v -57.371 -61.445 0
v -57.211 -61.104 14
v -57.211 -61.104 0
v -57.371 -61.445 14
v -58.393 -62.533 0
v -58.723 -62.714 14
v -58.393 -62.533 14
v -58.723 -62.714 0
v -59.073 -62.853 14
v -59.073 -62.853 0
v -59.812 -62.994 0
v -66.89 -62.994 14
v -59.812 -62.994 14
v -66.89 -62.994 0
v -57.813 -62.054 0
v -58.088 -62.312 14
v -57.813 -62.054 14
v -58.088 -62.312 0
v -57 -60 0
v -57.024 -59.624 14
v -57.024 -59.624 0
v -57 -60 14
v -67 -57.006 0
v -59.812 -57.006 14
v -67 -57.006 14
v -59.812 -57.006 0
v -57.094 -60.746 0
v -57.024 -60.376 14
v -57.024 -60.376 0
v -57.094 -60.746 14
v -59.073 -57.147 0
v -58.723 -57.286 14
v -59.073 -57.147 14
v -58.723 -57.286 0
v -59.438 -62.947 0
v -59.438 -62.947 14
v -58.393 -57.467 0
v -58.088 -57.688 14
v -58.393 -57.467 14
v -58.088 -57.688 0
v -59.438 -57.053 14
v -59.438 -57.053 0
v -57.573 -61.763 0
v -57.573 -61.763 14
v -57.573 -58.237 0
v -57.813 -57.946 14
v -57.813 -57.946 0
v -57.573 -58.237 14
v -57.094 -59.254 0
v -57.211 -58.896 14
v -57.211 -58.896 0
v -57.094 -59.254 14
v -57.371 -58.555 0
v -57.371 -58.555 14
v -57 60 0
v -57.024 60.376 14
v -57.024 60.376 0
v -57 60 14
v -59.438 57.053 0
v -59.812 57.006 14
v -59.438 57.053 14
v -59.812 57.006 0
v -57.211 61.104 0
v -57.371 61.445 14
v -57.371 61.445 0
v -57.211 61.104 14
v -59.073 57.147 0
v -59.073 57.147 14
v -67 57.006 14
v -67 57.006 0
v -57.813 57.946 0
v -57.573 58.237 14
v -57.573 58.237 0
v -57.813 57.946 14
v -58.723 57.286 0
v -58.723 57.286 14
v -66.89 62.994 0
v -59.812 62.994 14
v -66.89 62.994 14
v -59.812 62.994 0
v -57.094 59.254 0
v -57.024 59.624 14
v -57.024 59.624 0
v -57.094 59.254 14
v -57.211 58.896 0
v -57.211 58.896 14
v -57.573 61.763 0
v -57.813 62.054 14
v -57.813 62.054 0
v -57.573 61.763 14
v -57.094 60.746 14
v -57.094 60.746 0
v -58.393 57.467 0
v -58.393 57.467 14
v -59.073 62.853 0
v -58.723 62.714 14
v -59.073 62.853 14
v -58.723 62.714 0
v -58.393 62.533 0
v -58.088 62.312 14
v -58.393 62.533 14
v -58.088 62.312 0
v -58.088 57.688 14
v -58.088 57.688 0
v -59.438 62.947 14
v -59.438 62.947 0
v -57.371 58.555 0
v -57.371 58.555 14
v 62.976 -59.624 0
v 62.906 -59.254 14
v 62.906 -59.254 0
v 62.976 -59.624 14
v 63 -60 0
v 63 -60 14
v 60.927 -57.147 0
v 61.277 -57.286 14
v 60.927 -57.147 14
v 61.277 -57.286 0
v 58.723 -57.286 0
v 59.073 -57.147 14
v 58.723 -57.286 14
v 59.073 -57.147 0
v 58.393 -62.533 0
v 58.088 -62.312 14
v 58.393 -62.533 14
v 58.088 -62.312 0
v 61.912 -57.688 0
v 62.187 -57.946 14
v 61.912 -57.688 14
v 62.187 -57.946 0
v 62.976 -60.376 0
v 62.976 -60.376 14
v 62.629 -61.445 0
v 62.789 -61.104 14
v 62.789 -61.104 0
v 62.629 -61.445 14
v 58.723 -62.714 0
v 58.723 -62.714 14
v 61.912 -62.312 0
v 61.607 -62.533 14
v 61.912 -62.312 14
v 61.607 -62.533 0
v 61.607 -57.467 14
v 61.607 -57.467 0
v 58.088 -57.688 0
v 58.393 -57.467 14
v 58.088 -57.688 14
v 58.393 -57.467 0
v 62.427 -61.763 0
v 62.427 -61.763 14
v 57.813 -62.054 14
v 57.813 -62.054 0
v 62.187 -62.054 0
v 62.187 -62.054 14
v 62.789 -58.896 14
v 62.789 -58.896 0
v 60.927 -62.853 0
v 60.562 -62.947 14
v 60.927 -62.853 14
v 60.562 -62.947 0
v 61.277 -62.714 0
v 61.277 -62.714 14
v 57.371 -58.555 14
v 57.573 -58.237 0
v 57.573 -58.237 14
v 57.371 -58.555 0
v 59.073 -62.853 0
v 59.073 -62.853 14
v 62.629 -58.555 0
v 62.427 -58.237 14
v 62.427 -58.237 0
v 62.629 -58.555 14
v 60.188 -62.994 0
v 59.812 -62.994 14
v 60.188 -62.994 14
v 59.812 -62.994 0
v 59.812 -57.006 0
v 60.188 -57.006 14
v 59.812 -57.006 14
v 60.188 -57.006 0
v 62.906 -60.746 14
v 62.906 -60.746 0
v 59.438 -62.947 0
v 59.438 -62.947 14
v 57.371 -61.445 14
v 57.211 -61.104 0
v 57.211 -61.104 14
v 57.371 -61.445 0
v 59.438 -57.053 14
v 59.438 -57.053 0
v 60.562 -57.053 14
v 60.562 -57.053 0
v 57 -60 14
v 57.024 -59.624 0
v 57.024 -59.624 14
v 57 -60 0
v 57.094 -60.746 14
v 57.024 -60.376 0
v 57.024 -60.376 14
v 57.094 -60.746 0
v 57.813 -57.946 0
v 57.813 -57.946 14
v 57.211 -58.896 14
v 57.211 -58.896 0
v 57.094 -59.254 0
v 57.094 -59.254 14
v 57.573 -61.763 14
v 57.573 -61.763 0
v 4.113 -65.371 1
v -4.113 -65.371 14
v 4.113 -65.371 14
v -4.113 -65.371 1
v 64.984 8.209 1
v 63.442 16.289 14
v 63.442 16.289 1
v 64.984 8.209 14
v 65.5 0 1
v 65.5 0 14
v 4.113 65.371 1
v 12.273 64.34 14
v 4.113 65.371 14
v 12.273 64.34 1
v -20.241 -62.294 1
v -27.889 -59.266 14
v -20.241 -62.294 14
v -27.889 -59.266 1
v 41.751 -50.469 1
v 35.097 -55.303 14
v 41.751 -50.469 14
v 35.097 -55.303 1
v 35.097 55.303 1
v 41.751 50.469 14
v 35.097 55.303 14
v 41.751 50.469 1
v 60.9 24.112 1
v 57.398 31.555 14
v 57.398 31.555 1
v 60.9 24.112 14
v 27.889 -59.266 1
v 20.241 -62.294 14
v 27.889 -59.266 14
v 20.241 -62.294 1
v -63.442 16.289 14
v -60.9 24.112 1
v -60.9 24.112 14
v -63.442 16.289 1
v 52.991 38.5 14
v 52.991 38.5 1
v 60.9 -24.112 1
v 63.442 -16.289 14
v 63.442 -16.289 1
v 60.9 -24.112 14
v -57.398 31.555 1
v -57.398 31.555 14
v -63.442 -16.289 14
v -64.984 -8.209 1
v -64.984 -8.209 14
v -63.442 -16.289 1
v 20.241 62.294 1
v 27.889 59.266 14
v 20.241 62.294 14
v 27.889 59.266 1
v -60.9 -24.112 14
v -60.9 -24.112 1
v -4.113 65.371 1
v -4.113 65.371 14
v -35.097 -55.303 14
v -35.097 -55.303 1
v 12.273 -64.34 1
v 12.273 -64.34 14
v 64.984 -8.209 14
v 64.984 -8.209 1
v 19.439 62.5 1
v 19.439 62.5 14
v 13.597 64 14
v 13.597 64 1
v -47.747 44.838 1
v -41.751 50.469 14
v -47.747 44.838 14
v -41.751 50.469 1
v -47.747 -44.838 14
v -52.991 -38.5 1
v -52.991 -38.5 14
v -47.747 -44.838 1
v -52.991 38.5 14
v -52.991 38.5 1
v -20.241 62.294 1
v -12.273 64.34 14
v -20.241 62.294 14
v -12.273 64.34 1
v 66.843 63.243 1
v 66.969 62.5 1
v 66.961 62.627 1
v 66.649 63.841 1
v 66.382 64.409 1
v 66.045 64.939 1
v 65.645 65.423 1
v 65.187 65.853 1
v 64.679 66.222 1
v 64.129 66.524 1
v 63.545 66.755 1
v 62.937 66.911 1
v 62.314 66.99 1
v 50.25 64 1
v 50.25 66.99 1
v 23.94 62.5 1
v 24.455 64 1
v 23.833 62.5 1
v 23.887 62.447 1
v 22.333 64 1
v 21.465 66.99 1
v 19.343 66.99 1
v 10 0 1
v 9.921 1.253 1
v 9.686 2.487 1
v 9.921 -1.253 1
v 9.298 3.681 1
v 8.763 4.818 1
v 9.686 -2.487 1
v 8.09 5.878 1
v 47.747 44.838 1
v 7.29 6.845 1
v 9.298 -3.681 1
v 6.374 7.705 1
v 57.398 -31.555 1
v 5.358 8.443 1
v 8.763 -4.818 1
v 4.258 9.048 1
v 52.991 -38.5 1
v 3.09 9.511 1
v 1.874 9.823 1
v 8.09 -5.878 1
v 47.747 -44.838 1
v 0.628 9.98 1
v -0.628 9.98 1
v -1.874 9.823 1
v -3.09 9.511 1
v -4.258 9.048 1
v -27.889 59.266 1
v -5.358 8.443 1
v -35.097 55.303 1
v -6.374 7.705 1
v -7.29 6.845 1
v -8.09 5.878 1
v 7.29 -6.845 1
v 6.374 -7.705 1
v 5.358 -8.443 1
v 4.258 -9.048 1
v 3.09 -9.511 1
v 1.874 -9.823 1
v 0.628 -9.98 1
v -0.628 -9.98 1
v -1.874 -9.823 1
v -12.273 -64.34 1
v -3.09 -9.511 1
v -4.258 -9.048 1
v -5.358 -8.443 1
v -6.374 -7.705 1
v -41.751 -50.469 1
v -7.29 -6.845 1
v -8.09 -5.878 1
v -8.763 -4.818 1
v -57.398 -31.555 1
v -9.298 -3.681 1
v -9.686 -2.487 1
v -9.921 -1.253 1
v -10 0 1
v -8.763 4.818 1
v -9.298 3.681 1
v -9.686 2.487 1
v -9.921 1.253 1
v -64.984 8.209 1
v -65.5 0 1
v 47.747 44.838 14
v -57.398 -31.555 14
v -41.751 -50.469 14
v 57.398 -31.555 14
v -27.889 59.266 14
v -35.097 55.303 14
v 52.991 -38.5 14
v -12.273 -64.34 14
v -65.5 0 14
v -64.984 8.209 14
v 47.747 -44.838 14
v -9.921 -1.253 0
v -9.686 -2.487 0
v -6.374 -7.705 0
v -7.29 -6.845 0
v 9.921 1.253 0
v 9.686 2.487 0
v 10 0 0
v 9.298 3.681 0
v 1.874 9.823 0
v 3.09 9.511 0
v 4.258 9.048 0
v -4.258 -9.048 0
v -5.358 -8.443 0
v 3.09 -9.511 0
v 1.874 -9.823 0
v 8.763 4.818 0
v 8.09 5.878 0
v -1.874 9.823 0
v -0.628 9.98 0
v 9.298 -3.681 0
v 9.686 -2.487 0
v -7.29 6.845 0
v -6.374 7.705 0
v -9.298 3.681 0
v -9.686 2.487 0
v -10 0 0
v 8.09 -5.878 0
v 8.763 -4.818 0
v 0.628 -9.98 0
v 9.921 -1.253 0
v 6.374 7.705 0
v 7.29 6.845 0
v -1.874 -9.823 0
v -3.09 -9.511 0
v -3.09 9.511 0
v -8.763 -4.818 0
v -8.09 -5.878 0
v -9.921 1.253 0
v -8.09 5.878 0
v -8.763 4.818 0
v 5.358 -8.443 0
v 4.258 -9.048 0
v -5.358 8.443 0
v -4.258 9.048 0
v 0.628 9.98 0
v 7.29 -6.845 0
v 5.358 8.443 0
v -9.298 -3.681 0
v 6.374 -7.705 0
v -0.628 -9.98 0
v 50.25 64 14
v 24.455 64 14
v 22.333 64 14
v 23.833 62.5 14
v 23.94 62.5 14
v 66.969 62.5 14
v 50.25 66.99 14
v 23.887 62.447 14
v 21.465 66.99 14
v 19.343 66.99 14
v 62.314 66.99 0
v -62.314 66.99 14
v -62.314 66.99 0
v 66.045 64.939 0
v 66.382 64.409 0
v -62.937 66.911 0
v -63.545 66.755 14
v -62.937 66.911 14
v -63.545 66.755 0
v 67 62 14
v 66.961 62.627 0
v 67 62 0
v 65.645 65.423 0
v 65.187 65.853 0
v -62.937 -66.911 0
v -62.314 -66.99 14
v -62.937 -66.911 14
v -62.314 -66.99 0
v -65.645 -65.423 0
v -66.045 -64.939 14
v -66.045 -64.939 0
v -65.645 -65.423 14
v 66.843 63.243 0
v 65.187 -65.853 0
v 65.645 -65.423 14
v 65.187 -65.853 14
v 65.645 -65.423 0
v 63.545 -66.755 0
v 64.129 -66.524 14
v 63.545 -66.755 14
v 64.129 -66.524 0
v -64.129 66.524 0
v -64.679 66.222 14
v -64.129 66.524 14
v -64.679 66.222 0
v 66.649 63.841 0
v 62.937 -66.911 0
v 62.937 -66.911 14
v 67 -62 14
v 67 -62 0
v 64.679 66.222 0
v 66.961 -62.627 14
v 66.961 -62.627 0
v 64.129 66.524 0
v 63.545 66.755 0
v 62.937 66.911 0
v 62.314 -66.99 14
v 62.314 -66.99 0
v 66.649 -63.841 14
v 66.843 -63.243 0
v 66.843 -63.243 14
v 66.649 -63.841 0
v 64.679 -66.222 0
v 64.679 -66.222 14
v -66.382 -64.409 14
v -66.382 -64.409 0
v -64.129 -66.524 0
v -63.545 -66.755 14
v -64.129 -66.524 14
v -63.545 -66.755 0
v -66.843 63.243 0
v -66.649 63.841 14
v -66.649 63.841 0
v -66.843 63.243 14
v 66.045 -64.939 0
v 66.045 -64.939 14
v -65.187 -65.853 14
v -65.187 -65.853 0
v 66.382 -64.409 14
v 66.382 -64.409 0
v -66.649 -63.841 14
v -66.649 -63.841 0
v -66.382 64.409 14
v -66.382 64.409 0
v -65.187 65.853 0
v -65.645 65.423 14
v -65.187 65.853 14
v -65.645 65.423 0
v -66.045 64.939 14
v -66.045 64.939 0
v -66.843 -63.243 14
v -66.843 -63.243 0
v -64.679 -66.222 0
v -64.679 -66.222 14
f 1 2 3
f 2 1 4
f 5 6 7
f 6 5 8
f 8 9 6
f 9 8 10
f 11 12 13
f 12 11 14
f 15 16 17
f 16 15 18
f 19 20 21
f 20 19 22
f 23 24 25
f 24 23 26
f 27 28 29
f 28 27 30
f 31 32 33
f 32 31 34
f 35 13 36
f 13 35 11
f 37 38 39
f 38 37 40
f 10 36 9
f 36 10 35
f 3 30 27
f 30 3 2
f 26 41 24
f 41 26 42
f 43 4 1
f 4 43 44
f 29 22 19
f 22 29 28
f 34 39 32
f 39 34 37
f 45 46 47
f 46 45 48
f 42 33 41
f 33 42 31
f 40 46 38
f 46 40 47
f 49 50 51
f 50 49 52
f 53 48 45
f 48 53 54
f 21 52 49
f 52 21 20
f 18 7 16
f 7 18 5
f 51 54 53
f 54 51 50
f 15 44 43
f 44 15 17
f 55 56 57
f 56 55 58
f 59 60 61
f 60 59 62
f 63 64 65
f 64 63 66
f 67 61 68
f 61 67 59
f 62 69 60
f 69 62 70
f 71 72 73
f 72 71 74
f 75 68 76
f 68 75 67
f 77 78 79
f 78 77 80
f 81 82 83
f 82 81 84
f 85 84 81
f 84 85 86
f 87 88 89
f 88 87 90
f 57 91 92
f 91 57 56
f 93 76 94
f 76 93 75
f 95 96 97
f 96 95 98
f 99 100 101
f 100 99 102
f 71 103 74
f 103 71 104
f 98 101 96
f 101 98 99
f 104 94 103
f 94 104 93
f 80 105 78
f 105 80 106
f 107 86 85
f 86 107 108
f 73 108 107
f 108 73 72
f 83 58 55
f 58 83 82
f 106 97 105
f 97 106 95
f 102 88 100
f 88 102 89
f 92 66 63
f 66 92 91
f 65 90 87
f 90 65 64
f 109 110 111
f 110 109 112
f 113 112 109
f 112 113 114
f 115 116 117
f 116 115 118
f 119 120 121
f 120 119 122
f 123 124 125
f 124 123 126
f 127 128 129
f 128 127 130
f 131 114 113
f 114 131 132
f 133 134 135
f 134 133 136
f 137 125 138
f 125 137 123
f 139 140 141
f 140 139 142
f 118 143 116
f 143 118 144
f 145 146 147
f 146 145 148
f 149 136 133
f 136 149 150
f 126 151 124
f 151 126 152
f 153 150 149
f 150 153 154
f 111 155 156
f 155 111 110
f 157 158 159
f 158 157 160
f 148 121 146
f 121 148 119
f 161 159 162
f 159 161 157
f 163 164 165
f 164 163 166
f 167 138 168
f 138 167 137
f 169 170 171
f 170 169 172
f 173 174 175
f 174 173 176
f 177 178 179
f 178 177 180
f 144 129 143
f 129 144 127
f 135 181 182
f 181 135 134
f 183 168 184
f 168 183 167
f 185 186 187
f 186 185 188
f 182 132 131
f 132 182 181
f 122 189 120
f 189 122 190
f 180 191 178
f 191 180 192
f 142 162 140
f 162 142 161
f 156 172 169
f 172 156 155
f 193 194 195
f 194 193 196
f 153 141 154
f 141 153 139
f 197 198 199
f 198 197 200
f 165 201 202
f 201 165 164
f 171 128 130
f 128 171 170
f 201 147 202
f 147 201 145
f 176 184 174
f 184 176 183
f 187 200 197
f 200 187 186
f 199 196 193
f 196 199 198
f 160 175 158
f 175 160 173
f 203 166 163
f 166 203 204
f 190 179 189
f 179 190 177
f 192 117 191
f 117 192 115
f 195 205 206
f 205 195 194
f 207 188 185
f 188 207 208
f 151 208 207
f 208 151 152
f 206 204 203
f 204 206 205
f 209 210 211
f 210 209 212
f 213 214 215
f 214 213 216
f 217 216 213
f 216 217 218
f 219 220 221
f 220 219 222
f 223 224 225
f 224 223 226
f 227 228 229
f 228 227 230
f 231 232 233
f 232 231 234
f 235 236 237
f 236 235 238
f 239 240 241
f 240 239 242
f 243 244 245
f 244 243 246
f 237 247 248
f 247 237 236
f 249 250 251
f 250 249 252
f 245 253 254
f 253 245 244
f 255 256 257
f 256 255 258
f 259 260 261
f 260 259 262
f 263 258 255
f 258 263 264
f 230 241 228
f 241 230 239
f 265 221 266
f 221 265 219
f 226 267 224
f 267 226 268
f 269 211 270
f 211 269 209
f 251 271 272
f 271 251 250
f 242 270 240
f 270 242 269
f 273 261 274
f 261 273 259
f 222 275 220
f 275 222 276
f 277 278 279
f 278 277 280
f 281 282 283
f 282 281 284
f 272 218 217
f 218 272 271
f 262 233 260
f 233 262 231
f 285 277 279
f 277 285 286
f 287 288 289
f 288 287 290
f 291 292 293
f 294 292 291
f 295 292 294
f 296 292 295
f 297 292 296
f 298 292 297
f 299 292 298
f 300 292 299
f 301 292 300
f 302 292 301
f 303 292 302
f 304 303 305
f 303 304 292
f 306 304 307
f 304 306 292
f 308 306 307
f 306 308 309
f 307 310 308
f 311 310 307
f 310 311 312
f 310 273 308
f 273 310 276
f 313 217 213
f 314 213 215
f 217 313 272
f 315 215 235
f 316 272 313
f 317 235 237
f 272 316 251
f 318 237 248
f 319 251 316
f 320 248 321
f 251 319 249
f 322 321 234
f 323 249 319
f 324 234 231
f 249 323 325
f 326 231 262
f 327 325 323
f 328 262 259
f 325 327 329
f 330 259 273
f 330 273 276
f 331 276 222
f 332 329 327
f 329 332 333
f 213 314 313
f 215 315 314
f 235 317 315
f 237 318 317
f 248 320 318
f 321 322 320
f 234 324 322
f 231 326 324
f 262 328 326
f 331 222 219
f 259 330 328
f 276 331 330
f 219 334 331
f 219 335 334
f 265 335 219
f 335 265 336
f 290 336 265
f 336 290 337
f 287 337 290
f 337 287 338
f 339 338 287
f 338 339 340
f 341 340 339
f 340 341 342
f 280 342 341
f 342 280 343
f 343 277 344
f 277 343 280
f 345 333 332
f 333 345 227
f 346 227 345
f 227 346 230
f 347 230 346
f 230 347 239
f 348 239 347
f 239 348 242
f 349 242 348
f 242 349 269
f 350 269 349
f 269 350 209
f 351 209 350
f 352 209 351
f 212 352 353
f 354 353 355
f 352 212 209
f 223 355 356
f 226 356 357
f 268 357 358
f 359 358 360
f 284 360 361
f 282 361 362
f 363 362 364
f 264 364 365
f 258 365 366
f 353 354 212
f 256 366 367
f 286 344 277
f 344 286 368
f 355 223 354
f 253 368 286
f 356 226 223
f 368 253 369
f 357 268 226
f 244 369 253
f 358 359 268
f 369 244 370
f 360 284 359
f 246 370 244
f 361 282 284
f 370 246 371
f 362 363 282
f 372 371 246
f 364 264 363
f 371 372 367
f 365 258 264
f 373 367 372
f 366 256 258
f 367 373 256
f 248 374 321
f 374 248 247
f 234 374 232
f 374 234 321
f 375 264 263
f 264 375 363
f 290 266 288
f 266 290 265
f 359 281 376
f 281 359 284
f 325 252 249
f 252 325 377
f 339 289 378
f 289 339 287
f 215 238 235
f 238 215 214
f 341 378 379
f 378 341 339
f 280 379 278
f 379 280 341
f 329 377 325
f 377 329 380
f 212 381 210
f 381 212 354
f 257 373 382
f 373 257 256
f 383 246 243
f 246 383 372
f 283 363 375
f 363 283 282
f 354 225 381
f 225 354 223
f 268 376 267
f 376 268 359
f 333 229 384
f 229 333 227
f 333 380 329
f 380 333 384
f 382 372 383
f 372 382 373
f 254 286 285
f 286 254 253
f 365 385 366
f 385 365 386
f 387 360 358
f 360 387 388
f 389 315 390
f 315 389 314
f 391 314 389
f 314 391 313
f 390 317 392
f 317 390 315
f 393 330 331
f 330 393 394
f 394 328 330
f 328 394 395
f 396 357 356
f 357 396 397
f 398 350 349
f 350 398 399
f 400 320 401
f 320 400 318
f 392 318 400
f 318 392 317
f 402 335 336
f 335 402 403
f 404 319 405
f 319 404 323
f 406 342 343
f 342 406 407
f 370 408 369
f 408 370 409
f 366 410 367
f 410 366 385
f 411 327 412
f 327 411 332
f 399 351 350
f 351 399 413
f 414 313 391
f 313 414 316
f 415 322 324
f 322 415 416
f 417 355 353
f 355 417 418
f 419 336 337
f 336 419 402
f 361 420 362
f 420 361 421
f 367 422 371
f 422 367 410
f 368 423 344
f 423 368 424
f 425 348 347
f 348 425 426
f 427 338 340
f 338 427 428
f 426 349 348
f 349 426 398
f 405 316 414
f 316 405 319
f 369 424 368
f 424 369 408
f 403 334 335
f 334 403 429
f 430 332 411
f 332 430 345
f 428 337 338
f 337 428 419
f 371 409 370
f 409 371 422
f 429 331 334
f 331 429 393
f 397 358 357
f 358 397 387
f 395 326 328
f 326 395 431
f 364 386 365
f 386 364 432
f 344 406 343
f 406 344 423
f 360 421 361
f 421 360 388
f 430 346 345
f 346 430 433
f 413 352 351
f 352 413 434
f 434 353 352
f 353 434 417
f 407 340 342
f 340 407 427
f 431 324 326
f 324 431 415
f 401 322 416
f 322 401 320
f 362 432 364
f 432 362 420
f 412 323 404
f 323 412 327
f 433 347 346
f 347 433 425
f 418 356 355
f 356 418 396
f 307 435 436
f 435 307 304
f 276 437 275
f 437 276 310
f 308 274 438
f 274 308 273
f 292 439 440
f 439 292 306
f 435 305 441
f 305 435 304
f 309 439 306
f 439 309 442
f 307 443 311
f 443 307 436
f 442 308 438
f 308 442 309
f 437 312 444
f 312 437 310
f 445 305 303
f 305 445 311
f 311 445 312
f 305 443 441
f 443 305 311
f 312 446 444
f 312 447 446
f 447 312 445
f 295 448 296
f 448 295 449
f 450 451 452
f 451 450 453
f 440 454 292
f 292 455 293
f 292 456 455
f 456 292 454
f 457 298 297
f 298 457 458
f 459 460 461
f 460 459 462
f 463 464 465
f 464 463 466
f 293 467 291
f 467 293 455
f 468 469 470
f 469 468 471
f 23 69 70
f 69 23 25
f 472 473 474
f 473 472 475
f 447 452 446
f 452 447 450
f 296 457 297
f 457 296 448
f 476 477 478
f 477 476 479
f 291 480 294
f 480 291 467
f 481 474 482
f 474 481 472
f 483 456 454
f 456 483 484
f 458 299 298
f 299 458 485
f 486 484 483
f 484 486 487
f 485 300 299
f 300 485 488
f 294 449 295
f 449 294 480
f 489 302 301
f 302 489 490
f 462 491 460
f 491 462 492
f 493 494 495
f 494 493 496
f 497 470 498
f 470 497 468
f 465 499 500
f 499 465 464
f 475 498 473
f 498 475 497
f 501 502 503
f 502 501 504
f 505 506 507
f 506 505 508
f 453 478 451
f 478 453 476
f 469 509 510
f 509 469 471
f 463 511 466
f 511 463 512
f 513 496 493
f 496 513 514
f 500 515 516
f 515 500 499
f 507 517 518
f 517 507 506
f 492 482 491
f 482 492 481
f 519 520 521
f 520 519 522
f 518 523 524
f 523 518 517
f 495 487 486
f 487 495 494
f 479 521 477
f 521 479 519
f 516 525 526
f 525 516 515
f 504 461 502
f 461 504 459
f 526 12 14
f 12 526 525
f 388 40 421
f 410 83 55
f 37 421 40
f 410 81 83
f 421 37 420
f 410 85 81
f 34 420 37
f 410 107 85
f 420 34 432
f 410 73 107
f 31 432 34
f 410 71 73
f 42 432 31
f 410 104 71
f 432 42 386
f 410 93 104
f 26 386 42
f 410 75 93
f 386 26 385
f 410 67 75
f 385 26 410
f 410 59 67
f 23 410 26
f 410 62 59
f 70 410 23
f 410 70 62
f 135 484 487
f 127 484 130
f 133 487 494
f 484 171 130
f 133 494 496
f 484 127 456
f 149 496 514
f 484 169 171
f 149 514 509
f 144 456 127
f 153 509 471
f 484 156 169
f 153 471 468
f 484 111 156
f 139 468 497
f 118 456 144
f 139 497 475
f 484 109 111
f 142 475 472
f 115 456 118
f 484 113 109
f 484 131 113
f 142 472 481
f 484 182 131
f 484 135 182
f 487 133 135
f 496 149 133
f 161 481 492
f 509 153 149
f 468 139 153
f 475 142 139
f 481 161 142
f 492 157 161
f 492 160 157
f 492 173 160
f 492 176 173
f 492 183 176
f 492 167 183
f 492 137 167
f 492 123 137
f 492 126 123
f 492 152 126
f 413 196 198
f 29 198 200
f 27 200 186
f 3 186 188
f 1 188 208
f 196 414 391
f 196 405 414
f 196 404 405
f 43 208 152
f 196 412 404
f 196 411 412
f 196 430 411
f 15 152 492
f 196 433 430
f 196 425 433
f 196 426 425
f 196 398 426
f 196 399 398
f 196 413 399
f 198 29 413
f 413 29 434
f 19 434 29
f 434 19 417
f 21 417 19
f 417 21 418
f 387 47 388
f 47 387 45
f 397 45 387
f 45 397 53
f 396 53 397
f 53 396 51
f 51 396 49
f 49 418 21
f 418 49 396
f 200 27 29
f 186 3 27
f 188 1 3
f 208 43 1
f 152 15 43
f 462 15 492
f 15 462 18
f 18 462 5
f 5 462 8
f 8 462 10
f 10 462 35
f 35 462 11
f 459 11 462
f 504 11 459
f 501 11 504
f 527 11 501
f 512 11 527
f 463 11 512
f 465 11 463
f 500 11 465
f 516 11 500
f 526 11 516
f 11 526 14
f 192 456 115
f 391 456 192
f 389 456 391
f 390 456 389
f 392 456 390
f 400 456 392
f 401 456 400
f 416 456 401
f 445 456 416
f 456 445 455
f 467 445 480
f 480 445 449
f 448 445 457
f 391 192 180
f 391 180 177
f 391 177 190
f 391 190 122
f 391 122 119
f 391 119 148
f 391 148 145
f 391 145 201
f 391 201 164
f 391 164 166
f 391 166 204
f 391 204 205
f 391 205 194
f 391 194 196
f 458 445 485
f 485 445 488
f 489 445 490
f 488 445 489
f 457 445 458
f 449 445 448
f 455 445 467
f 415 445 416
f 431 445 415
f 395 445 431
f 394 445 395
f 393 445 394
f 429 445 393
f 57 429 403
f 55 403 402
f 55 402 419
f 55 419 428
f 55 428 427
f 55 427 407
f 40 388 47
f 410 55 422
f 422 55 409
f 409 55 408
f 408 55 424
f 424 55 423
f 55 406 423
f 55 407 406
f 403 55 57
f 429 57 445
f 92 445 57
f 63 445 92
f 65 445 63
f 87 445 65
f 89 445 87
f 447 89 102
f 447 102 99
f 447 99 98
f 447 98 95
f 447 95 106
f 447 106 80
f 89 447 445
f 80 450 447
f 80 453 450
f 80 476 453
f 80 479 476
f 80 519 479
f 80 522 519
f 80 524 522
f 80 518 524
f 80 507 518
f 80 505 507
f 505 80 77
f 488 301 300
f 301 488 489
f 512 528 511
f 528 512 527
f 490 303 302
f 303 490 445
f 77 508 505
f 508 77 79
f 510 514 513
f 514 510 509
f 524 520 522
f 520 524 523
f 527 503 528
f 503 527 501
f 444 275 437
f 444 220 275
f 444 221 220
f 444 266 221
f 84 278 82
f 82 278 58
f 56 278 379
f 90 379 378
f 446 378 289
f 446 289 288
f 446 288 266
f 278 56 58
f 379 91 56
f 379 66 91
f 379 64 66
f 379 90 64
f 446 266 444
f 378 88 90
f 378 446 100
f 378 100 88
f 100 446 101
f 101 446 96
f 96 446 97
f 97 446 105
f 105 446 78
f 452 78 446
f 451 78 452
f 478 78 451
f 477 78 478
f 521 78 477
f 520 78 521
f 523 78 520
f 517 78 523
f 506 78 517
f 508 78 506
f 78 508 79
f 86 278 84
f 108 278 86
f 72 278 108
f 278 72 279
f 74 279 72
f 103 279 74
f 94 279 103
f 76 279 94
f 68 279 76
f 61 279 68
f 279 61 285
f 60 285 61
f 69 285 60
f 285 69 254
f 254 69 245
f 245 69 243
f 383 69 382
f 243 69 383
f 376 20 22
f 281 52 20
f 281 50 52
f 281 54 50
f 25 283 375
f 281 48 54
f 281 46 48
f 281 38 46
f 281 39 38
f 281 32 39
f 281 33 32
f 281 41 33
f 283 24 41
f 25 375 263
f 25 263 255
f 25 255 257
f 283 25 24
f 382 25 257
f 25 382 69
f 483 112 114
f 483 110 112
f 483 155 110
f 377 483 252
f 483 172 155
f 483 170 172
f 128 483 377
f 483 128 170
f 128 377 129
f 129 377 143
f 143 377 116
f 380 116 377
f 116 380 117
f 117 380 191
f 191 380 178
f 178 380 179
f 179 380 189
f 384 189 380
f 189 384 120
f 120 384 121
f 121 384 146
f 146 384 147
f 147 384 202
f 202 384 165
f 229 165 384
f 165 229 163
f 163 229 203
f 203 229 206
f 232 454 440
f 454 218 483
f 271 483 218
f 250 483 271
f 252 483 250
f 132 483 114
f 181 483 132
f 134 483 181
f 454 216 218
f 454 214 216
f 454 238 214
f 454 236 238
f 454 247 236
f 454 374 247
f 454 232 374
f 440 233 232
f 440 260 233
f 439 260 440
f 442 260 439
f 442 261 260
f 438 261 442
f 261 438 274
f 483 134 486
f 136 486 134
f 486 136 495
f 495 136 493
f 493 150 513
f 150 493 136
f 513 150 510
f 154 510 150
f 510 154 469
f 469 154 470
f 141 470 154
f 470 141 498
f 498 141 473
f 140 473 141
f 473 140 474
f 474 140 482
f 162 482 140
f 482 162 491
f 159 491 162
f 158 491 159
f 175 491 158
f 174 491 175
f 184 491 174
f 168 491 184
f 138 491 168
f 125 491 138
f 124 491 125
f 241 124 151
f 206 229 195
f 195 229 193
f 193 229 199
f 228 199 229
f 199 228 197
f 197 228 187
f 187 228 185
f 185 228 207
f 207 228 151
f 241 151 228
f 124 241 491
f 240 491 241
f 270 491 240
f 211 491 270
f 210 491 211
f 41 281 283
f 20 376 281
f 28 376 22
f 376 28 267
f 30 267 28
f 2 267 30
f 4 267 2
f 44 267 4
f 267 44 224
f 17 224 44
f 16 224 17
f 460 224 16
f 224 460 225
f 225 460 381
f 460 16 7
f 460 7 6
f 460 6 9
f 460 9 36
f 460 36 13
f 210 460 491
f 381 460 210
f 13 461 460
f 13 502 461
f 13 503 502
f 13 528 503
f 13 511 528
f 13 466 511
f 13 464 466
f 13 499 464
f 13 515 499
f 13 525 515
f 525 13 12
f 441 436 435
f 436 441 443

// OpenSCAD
$fn = 50;


difference() {
	union() {
		translate(v = [0, 0, 0]) {
			rotate(a = [0, 0, 0]) {
				hull() {
					translate(v = [-62.0000000000, 62.0000000000, 0]) {
						rotate(a = [0, 0, 0]) {
							translate(v = [0, 0, 0]) {
								rotate(a = [0, 0, 0]) {
									cylinder(h = 14, r = 5);
								}
							}
						}
					}
					translate(v = [62.0000000000, 62.0000000000, 0]) {
						rotate(a = [0, 0, 0]) {
							translate(v = [0, 0, 0]) {
								rotate(a = [0, 0, 0]) {
									cylinder(h = 14, r = 5);
								}
							}
						}
					}
					translate(v = [-62.0000000000, -62.0000000000, 0]) {
						rotate(a = [0, 0, 0]) {
							translate(v = [0, 0, 0]) {
								rotate(a = [0, 0, 0]) {
									cylinder(h = 14, r = 5);
								}
							}
						}
					}
					translate(v = [62.0000000000, -62.0000000000, 0]) {
						rotate(a = [0, 0, 0]) {
							translate(v = [0, 0, 0]) {
								rotate(a = [0, 0, 0]) {
									cylinder(h = 14, r = 5);
								}
							}
						}
					}
				}
			}
		}
	}
	union() {
		translate(v = [-67.5000000000, -60.0000000000, -125]) {
			rotate(a = [0, 0, 0]) {
				hull() {
					translate(v = [7.5000000000, 0, 0]) {
						rotate(a = [0, 0, 0]) {
							translate(v = [0, 0, 0]) {
								rotate(a = [0, 0, 0]) {
									cylinder(h = 250, r = 3.0000000000);
								}
							}
						}
					}
					translate(v = [-7.5000000000, 0, 0]) {
						rotate(a = [0, 0, 0]) {
							translate(v = [0, 0, 0]) {
								rotate(a = [0, 0, 0]) {
									cylinder(h = 250, r = 3.0000000000);
								}
							}
						}
					}
				}
			}
		}
		translate(v = [-67.5000000000, 60.0000000000, -125]) {
			rotate(a = [0, 0, 0]) {
				hull() {
					translate(v = [7.5000000000, 0, 0]) {
						rotate(a = [0, 0, 0]) {
							translate(v = [0, 0, 0]) {
								rotate(a = [0, 0, 0]) {
									cylinder(h = 250, r = 3.0000000000);
								}
							}
						}
					}
					translate(v = [-7.5000000000, 0, 0]) {
						rotate(a = [0, 0, 0]) {
							translate(v = [0, 0, 0]) {
								rotate(a = [0, 0, 0]) {
									cylinder(h = 250, r = 3.0000000000);
								}
							}
						}
					}
				}
			}
		}
		translate(v = [60.0000000000, -60.0000000000, -125.0000000000]) {
			rotate(a = [0, 0, 0]) {
				cylinder(h = 250, r = 3.0000000000);
			}
		}
		translate(v = [0, 0, 1.0000000000]) {
			rotate(a = [0, 0, 0]) {
				cylinder(h = 16, r = 65.5000000000);
			}
		}
		translate(v = [0, 0, -7.0000000000]) {
			rotate(a = [0, 0, 0]) {
				cylinder(h = 14, r = 10.0000000000);
			}
		}
		translate(v = [0.0000000000, 62.5000000000, 1]) {
			rotate(a = [0, 0, 0]) {
				cube(size = [67.0000000000, 1.5000000000, 16]);
			}
		}
		translate(v = [50.2500000000, 62.5000000000, 1]) {
			rotate(a = [0, 0, 0]) {
				cube(size = [16.7500000000, 4.5000000000, 16]);
			}
		}
		translate(v = [18.5833333333, 67.7500000000, 1]) {
			rotate(a = [0, 0, -45]) {
				cube(size = [7.5000000000, 1.5000000000, 16]);
			}
		}
	}
}
